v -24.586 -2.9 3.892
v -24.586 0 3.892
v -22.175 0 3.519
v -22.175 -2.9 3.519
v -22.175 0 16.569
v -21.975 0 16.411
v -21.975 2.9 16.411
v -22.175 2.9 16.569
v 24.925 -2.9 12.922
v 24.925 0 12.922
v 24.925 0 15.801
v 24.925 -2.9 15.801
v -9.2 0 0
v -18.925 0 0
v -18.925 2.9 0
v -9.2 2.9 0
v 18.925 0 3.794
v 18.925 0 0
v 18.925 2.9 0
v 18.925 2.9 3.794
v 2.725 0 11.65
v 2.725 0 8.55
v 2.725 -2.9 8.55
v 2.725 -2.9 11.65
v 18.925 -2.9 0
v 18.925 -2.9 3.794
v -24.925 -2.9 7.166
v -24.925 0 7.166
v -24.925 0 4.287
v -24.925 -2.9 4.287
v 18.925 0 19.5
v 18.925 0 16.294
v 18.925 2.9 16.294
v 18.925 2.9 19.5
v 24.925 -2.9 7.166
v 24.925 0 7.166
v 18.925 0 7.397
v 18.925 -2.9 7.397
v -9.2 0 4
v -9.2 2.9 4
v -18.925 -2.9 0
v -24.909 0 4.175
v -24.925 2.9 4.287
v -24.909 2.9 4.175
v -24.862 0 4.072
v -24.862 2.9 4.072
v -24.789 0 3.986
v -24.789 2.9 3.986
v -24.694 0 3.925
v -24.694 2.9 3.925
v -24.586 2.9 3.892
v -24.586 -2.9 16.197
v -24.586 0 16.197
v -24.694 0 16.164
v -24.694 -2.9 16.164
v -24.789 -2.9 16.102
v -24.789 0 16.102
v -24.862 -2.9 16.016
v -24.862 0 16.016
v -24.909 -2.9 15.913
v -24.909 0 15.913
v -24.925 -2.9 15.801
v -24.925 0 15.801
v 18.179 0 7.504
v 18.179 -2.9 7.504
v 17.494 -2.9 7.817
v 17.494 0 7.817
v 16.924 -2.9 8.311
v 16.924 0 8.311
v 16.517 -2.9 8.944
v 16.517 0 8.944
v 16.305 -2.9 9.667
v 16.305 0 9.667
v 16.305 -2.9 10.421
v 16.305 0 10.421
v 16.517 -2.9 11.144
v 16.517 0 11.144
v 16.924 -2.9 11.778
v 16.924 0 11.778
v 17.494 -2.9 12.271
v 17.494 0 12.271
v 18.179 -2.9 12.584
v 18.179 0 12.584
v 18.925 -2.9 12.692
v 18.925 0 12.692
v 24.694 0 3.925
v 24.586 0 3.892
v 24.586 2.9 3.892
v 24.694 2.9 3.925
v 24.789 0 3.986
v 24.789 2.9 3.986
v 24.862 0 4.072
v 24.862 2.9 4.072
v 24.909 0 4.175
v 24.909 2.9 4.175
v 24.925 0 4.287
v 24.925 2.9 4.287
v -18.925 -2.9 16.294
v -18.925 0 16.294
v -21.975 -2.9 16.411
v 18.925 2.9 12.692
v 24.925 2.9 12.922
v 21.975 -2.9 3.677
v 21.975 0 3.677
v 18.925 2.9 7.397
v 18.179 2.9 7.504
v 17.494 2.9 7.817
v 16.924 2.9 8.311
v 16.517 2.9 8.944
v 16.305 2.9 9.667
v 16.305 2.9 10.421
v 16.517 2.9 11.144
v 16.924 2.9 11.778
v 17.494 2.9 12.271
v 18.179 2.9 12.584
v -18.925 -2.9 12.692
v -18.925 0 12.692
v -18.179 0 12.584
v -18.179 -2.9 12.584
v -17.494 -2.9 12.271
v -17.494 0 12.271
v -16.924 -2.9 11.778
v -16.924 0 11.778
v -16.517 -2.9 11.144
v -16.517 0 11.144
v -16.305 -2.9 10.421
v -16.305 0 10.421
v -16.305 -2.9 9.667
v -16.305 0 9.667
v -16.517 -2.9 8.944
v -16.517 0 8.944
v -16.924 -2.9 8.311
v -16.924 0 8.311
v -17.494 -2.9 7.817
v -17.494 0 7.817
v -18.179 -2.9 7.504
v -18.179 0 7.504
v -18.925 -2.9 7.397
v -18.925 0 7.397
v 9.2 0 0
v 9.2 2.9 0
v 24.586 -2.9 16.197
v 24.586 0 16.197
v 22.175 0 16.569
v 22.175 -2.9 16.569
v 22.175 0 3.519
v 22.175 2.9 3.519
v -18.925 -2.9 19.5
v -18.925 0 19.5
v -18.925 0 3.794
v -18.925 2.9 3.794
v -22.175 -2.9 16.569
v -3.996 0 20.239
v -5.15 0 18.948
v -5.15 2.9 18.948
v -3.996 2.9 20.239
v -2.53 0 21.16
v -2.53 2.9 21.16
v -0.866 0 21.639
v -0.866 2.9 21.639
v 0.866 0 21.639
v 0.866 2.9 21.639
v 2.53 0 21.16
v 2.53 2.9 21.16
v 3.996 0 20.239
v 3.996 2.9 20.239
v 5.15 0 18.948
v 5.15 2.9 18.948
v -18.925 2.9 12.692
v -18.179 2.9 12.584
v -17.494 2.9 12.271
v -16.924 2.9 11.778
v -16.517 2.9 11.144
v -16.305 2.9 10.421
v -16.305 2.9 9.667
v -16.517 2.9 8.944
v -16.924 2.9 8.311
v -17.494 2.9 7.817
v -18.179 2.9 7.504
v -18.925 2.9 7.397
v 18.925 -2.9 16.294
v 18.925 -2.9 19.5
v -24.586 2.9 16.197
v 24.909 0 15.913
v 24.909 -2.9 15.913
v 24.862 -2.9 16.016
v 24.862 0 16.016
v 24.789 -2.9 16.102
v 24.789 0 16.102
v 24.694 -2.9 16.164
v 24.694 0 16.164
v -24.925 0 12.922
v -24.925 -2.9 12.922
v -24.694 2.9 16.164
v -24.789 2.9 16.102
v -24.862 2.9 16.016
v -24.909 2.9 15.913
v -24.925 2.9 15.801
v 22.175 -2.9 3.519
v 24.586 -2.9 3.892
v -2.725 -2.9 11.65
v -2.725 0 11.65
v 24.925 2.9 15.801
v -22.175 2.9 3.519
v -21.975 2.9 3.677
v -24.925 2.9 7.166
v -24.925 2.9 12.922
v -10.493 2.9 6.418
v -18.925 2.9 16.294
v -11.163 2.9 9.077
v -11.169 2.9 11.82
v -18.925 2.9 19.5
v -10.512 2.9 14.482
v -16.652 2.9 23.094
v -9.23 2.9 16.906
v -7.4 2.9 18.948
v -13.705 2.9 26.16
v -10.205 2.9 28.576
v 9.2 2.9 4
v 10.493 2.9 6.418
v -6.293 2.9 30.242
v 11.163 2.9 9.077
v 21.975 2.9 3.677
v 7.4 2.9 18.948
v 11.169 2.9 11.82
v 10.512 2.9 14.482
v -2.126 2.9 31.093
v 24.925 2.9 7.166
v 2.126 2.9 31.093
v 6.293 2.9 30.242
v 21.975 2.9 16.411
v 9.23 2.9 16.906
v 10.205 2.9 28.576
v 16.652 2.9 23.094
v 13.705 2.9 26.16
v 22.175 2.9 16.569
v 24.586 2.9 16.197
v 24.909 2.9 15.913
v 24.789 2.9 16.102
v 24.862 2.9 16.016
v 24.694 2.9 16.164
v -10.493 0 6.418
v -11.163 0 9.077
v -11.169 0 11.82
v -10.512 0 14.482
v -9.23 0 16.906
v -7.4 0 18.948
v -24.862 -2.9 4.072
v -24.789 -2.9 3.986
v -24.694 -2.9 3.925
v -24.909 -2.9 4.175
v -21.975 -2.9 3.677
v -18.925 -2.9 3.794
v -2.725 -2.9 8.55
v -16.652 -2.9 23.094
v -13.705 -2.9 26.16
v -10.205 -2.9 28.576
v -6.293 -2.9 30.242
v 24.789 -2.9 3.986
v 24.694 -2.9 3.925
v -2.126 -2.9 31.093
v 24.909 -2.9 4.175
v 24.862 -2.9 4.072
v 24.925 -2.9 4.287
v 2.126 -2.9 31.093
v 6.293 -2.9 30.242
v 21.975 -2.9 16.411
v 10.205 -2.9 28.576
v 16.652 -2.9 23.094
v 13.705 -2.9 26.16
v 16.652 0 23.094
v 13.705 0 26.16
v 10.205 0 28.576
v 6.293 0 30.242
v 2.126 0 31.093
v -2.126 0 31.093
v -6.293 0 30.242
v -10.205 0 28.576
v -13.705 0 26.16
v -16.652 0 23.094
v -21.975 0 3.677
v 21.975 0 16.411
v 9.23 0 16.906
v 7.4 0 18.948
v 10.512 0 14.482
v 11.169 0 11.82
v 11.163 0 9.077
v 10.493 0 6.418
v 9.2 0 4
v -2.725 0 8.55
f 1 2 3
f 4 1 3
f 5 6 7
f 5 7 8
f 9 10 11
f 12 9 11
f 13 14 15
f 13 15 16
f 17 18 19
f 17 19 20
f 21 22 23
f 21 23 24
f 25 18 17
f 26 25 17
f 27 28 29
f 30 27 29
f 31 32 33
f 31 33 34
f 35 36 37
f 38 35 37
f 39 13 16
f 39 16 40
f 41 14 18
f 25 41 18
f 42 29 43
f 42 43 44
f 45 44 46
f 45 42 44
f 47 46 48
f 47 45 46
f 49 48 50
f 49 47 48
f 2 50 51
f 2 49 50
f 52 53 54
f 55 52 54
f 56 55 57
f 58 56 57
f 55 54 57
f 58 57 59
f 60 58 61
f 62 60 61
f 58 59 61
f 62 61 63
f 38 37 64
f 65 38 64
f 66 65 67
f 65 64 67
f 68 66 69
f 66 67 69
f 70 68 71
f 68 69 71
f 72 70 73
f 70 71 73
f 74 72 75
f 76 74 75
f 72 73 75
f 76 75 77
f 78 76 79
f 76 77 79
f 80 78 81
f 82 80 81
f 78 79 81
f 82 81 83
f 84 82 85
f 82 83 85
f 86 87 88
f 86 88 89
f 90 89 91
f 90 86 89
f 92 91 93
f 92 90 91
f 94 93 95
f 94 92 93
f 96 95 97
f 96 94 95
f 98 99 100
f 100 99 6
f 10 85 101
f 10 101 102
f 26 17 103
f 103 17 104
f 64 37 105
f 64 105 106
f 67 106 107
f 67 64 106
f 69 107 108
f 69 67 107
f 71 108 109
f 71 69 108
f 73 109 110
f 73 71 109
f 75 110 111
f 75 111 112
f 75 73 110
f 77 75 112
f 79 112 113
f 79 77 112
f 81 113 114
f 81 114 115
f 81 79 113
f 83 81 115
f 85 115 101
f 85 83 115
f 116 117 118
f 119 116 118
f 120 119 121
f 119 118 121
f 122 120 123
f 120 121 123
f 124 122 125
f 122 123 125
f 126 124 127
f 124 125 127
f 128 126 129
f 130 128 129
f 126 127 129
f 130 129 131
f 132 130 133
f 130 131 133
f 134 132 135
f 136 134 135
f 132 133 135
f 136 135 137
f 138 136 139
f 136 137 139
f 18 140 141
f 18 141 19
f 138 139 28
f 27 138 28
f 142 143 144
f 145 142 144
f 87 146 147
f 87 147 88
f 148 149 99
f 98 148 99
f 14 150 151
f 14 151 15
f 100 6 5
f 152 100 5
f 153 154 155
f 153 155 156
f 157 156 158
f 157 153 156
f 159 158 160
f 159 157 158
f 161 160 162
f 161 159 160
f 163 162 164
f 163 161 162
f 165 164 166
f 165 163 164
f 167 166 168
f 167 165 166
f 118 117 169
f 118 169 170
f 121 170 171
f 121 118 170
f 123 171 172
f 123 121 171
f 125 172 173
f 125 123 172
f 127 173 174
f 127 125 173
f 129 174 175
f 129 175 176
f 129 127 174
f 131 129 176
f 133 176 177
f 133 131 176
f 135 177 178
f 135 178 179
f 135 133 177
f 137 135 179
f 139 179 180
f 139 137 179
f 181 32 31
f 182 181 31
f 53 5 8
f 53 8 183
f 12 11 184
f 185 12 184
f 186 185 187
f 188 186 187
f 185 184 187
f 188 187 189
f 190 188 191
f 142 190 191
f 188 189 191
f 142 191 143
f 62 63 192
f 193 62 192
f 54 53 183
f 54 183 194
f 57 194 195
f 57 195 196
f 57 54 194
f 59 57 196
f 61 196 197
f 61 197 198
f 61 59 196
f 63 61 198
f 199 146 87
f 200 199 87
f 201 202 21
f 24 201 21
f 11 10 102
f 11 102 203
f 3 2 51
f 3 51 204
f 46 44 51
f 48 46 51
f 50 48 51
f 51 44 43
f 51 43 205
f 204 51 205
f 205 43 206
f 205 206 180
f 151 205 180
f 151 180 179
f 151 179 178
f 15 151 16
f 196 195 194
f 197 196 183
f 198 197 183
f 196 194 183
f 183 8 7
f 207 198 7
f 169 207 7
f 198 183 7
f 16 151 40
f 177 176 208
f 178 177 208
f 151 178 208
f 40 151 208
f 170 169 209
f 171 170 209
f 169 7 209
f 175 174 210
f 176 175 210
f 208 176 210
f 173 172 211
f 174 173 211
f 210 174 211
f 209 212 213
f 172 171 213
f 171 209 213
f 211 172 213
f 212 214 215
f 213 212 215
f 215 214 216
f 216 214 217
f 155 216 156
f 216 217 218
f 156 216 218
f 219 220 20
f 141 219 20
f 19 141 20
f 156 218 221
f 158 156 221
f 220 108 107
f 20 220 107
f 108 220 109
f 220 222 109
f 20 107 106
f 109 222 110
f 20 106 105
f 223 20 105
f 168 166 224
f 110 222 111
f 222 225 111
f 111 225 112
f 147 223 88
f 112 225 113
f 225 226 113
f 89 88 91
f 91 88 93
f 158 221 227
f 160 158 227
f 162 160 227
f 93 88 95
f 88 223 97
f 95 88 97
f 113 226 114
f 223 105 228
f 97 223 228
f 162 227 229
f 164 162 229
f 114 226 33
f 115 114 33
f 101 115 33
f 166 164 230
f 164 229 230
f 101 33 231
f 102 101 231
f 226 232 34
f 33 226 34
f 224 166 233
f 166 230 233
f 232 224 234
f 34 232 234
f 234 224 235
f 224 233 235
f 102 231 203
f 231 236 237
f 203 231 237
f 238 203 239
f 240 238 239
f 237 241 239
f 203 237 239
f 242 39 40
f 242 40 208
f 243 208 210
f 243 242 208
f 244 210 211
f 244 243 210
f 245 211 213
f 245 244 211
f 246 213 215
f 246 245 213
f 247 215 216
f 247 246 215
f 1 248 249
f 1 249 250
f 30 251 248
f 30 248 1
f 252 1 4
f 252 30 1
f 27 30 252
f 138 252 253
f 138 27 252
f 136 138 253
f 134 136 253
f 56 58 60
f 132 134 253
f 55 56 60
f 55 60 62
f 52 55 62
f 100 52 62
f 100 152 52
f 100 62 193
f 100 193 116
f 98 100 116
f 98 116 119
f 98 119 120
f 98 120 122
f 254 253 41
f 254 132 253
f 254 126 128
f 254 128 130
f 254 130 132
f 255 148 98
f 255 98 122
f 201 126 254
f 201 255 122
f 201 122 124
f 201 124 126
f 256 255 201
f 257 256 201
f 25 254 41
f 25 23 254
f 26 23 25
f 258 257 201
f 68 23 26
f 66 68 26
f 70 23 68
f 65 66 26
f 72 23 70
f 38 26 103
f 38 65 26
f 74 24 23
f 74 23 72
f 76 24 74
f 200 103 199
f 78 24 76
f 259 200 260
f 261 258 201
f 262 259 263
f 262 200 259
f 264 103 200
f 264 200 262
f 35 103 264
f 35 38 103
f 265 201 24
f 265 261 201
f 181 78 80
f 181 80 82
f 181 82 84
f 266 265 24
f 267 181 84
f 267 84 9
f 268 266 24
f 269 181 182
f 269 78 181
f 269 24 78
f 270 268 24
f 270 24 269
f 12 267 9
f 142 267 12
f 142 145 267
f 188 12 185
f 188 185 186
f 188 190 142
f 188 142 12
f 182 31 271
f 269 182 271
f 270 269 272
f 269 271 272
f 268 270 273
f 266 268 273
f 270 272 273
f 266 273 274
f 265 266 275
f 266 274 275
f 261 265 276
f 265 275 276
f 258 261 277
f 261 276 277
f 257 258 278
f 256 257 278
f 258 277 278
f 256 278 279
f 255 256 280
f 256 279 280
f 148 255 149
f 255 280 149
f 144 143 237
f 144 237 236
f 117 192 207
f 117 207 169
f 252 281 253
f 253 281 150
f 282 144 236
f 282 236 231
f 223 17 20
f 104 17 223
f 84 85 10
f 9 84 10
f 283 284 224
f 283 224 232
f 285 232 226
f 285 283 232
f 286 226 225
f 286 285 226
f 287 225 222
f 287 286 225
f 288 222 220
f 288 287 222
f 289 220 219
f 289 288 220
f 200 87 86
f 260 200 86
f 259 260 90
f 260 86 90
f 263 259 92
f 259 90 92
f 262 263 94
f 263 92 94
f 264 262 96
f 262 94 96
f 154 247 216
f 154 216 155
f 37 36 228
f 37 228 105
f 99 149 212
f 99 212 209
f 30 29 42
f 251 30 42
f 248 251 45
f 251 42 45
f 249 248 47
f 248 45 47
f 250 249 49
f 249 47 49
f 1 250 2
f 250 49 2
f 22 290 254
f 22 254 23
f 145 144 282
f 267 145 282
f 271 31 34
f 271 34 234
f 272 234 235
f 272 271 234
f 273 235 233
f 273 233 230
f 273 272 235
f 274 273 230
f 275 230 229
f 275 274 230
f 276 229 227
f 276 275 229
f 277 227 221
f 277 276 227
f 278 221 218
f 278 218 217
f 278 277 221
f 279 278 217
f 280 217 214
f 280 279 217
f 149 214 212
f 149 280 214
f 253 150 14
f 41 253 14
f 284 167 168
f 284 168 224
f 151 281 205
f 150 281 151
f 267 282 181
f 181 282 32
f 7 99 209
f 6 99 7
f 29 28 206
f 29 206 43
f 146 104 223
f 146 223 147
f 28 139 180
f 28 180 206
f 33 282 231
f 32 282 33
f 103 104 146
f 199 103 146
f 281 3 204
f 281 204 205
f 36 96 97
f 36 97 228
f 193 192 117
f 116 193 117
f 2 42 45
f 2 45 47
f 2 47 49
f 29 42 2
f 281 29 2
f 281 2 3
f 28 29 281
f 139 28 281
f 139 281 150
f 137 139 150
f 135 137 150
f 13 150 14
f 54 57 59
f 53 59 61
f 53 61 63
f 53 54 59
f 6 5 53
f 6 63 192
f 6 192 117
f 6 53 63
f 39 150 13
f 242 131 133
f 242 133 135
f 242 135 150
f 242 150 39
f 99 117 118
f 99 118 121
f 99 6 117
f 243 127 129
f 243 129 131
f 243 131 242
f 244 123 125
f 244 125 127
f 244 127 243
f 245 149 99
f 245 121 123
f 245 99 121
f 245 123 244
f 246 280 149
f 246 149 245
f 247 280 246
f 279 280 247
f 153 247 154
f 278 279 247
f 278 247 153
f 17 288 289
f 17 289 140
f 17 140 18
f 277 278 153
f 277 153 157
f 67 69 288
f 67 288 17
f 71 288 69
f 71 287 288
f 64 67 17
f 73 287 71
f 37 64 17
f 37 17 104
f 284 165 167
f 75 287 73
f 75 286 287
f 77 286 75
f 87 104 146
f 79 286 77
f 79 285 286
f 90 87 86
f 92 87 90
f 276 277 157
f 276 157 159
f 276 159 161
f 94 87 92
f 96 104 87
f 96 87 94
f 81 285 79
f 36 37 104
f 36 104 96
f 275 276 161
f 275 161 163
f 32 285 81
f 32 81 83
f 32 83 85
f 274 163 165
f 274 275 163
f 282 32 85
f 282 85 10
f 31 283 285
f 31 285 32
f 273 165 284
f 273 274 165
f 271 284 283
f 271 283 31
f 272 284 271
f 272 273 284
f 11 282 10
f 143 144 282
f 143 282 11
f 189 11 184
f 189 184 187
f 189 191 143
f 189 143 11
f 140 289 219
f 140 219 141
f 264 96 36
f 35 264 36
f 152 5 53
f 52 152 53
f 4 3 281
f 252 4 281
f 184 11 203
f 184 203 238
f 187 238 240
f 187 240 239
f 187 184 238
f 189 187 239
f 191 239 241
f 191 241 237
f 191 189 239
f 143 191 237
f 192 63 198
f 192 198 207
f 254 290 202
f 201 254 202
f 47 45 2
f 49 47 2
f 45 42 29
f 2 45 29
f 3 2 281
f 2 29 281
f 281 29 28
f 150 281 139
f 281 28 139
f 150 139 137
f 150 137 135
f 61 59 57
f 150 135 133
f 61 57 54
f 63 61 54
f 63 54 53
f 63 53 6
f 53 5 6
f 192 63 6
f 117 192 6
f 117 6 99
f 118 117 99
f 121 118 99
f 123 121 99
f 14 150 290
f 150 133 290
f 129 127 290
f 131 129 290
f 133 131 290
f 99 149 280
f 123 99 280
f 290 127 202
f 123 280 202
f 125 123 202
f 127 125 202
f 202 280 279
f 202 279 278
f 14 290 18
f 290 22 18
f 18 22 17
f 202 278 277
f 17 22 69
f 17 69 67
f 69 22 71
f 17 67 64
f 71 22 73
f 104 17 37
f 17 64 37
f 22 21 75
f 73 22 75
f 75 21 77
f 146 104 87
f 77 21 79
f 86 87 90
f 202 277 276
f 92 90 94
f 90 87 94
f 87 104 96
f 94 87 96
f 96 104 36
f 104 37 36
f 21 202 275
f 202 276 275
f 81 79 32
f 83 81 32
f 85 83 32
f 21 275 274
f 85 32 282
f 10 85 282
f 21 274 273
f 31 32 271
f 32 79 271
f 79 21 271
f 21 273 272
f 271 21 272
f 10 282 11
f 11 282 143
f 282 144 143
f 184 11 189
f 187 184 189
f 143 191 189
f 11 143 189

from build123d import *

# Parameters (mm, degrees)
F0_W     = 5.45
F0_H     = 3.1
F1_DEPTH = 2.9
F3_DEPTH = 2.9


with BuildPart() as f1:
    # F0 (on Front) → F1 (new body)
    with BuildSketch(Plane.XZ):
        with BuildLine():
            Line((-18.925, 3.794204), (-18.925, 0))
            Line((-18.925, 0), (18.925, 0))
            Line((18.925, 0), (18.925, 3.794204))
            Line((18.925, 3.794204), (21.975, 3.677))
            Line((21.975, 3.677), (22.175, 3.519204))
            Line((22.175, 3.519204), (24.586093, 3.891828))
            ThreePointArc((24.586093, 3.891828), (24.828675, 4.026786), (24.925, 4.287135))
            Line((24.925, 4.287135), (24.925, 7.166296))
            Line((24.925, 7.166296), (18.925, 7.396861))
            ThreePointArc((18.925, 7.396861), (16.277657, 10.044204), (18.925, 12.691547))
            Line((18.925, 12.691547), (24.925, 12.922112))
            Line((24.925, 12.922112), (24.925, 15.801274))
            ThreePointArc((24.925, 15.801274), (24.828675, 16.061622), (24.586093, 16.196581))
            Line((24.586093, 16.196581), (22.175, 16.569204))
            Line((22.175, 16.569204), (21.975, 16.411408))
            Line((21.975, 16.411408), (18.925, 16.294204))
            Line((18.925, 16.294204), (18.925, 19.5))
            ThreePointArc((18.925, 19.5), (0, 31.2), (-18.925, 19.5))
            Line((-18.925, 19.5), (-18.925, 16.294204))
            Line((-18.925, 16.294204), (-21.975, 16.411408))
            Line((-21.975, 16.411408), (-22.175, 16.569204))
            Line((-22.175, 16.569204), (-24.586093, 16.196581))
            ThreePointArc((-24.586093, 16.196581), (-24.828675, 16.061622), (-24.925, 15.801274))
            Line((-24.925, 15.801274), (-24.925, 12.922112))
            Line((-24.925, 12.922112), (-18.925, 12.691547))
            ThreePointArc((-18.925, 12.691547), (-16.277657, 10.044204), (-18.925, 7.396861))
            Line((-18.925, 7.396861), (-24.925, 7.166296))
            Line((-24.925, 7.166296), (-24.925, 4.287135))
            ThreePointArc((-24.925, 4.287135), (-24.828675, 4.026786), (-24.586093, 3.891828))
            Line((-24.586093, 3.891828), (-22.175, 3.519204))
            Line((-22.175, 3.519204), (-21.975, 3.677))
            Line((-21.975, 3.677), (-18.925, 3.794204))
        make_face()
        with Locations((0, 10.1)):
            Rectangle(F0_W, F0_H, mode=Mode.SUBTRACT)
    extrude(amount=F1_DEPTH)


with BuildPart() as f3:
    # F2 (on Front) → F3 (new body)
    with BuildSketch(Plane.XZ):
        with BuildLine():
            Line((18.925, 16.294204), (18.925, 19.5))
            ThreePointArc((18.925, 19.5), (0, 31.2), (-18.925, 19.5))
            Line((-18.925, 19.5), (-18.925, 16.294204))
            Line((-18.925, 16.294204), (-21.975, 16.411408))
            Line((-21.975, 16.411408), (-22.175, 16.569204))
            Line((-22.175, 16.569204), (-24.586093, 16.196581))
            ThreePointArc((-24.586093, 16.196581), (-24.828675, 16.061622), (-24.925, 15.801274))
            Line((-24.925, 15.801274), (-24.925, 12.922112))
            Line((-24.925, 12.922112), (-18.925, 12.691547))
            ThreePointArc((-18.925, 12.691547), (-16.277657, 10.044204), (-18.925, 7.396861))
            Line((-18.925, 7.396861), (-24.925, 7.166296))
            Line((-24.925, 7.166296), (-24.925, 4.287135))
            ThreePointArc((-24.925, 4.287135), (-24.828675, 4.026786), (-24.586093, 3.891828))
            Line((-24.586093, 3.891828), (-22.175, 3.519204))
            Line((-22.175, 3.519204), (-21.975, 3.677))
            Line((-21.975, 3.677), (-18.925, 3.794204))
            Line((-18.925, 3.794204), (-18.925, 0))
            Line((-18.925, 0), (-9.2, 0))
            Line((-9.2, 0), (-9.2, 4))
            ThreePointArc((-9.2, 4), (-11.169316, 11.819704), (-7.4, 18.948394))
            Line((-7.4, 18.948394), (-5.15, 18.948394))
            ThreePointArc((-5.15, 18.948394), (0, 21.7), (5.15, 18.948394))
            Line((5.15, 18.948394), (7.4, 18.948394))
            ThreePointArc((7.4, 18.948394), (11.169316, 11.819704), (9.2, 4))
            Line((9.2, 4), (9.2, 0))
            Line((9.2, 0), (18.925, 0))
            Line((18.925, 0), (18.925, 3.794204))
            Line((18.925, 3.794204), (21.975, 3.677))
            Line((21.975, 3.677), (22.175, 3.519204))
            Line((22.175, 3.519204), (24.586093, 3.891828))
            ThreePointArc((24.586093, 3.891828), (24.828675, 4.026786), (24.925, 4.287135))
            Line((24.925, 4.287135), (24.925, 7.166296))
            Line((24.925, 7.166296), (18.925, 7.396861))
            ThreePointArc((18.925, 7.396861), (16.277657, 10.044204), (18.925, 12.691547))
            Line((18.925, 12.691547), (24.925, 12.922112))
            Line((24.925, 12.922112), (24.925, 15.801274))
            ThreePointArc((24.925, 15.801274), (24.828675, 16.061622), (24.586093, 16.196581))
            Line((24.586093, 16.196581), (22.175, 16.569204))
            Line((22.175, 16.569204), (21.975, 16.411408))
            Line((21.975, 16.411408), (18.925, 16.294204))
        make_face()
    extrude(amount=-F3_DEPTH)


solid = Compound([f1.part, f3.part])
